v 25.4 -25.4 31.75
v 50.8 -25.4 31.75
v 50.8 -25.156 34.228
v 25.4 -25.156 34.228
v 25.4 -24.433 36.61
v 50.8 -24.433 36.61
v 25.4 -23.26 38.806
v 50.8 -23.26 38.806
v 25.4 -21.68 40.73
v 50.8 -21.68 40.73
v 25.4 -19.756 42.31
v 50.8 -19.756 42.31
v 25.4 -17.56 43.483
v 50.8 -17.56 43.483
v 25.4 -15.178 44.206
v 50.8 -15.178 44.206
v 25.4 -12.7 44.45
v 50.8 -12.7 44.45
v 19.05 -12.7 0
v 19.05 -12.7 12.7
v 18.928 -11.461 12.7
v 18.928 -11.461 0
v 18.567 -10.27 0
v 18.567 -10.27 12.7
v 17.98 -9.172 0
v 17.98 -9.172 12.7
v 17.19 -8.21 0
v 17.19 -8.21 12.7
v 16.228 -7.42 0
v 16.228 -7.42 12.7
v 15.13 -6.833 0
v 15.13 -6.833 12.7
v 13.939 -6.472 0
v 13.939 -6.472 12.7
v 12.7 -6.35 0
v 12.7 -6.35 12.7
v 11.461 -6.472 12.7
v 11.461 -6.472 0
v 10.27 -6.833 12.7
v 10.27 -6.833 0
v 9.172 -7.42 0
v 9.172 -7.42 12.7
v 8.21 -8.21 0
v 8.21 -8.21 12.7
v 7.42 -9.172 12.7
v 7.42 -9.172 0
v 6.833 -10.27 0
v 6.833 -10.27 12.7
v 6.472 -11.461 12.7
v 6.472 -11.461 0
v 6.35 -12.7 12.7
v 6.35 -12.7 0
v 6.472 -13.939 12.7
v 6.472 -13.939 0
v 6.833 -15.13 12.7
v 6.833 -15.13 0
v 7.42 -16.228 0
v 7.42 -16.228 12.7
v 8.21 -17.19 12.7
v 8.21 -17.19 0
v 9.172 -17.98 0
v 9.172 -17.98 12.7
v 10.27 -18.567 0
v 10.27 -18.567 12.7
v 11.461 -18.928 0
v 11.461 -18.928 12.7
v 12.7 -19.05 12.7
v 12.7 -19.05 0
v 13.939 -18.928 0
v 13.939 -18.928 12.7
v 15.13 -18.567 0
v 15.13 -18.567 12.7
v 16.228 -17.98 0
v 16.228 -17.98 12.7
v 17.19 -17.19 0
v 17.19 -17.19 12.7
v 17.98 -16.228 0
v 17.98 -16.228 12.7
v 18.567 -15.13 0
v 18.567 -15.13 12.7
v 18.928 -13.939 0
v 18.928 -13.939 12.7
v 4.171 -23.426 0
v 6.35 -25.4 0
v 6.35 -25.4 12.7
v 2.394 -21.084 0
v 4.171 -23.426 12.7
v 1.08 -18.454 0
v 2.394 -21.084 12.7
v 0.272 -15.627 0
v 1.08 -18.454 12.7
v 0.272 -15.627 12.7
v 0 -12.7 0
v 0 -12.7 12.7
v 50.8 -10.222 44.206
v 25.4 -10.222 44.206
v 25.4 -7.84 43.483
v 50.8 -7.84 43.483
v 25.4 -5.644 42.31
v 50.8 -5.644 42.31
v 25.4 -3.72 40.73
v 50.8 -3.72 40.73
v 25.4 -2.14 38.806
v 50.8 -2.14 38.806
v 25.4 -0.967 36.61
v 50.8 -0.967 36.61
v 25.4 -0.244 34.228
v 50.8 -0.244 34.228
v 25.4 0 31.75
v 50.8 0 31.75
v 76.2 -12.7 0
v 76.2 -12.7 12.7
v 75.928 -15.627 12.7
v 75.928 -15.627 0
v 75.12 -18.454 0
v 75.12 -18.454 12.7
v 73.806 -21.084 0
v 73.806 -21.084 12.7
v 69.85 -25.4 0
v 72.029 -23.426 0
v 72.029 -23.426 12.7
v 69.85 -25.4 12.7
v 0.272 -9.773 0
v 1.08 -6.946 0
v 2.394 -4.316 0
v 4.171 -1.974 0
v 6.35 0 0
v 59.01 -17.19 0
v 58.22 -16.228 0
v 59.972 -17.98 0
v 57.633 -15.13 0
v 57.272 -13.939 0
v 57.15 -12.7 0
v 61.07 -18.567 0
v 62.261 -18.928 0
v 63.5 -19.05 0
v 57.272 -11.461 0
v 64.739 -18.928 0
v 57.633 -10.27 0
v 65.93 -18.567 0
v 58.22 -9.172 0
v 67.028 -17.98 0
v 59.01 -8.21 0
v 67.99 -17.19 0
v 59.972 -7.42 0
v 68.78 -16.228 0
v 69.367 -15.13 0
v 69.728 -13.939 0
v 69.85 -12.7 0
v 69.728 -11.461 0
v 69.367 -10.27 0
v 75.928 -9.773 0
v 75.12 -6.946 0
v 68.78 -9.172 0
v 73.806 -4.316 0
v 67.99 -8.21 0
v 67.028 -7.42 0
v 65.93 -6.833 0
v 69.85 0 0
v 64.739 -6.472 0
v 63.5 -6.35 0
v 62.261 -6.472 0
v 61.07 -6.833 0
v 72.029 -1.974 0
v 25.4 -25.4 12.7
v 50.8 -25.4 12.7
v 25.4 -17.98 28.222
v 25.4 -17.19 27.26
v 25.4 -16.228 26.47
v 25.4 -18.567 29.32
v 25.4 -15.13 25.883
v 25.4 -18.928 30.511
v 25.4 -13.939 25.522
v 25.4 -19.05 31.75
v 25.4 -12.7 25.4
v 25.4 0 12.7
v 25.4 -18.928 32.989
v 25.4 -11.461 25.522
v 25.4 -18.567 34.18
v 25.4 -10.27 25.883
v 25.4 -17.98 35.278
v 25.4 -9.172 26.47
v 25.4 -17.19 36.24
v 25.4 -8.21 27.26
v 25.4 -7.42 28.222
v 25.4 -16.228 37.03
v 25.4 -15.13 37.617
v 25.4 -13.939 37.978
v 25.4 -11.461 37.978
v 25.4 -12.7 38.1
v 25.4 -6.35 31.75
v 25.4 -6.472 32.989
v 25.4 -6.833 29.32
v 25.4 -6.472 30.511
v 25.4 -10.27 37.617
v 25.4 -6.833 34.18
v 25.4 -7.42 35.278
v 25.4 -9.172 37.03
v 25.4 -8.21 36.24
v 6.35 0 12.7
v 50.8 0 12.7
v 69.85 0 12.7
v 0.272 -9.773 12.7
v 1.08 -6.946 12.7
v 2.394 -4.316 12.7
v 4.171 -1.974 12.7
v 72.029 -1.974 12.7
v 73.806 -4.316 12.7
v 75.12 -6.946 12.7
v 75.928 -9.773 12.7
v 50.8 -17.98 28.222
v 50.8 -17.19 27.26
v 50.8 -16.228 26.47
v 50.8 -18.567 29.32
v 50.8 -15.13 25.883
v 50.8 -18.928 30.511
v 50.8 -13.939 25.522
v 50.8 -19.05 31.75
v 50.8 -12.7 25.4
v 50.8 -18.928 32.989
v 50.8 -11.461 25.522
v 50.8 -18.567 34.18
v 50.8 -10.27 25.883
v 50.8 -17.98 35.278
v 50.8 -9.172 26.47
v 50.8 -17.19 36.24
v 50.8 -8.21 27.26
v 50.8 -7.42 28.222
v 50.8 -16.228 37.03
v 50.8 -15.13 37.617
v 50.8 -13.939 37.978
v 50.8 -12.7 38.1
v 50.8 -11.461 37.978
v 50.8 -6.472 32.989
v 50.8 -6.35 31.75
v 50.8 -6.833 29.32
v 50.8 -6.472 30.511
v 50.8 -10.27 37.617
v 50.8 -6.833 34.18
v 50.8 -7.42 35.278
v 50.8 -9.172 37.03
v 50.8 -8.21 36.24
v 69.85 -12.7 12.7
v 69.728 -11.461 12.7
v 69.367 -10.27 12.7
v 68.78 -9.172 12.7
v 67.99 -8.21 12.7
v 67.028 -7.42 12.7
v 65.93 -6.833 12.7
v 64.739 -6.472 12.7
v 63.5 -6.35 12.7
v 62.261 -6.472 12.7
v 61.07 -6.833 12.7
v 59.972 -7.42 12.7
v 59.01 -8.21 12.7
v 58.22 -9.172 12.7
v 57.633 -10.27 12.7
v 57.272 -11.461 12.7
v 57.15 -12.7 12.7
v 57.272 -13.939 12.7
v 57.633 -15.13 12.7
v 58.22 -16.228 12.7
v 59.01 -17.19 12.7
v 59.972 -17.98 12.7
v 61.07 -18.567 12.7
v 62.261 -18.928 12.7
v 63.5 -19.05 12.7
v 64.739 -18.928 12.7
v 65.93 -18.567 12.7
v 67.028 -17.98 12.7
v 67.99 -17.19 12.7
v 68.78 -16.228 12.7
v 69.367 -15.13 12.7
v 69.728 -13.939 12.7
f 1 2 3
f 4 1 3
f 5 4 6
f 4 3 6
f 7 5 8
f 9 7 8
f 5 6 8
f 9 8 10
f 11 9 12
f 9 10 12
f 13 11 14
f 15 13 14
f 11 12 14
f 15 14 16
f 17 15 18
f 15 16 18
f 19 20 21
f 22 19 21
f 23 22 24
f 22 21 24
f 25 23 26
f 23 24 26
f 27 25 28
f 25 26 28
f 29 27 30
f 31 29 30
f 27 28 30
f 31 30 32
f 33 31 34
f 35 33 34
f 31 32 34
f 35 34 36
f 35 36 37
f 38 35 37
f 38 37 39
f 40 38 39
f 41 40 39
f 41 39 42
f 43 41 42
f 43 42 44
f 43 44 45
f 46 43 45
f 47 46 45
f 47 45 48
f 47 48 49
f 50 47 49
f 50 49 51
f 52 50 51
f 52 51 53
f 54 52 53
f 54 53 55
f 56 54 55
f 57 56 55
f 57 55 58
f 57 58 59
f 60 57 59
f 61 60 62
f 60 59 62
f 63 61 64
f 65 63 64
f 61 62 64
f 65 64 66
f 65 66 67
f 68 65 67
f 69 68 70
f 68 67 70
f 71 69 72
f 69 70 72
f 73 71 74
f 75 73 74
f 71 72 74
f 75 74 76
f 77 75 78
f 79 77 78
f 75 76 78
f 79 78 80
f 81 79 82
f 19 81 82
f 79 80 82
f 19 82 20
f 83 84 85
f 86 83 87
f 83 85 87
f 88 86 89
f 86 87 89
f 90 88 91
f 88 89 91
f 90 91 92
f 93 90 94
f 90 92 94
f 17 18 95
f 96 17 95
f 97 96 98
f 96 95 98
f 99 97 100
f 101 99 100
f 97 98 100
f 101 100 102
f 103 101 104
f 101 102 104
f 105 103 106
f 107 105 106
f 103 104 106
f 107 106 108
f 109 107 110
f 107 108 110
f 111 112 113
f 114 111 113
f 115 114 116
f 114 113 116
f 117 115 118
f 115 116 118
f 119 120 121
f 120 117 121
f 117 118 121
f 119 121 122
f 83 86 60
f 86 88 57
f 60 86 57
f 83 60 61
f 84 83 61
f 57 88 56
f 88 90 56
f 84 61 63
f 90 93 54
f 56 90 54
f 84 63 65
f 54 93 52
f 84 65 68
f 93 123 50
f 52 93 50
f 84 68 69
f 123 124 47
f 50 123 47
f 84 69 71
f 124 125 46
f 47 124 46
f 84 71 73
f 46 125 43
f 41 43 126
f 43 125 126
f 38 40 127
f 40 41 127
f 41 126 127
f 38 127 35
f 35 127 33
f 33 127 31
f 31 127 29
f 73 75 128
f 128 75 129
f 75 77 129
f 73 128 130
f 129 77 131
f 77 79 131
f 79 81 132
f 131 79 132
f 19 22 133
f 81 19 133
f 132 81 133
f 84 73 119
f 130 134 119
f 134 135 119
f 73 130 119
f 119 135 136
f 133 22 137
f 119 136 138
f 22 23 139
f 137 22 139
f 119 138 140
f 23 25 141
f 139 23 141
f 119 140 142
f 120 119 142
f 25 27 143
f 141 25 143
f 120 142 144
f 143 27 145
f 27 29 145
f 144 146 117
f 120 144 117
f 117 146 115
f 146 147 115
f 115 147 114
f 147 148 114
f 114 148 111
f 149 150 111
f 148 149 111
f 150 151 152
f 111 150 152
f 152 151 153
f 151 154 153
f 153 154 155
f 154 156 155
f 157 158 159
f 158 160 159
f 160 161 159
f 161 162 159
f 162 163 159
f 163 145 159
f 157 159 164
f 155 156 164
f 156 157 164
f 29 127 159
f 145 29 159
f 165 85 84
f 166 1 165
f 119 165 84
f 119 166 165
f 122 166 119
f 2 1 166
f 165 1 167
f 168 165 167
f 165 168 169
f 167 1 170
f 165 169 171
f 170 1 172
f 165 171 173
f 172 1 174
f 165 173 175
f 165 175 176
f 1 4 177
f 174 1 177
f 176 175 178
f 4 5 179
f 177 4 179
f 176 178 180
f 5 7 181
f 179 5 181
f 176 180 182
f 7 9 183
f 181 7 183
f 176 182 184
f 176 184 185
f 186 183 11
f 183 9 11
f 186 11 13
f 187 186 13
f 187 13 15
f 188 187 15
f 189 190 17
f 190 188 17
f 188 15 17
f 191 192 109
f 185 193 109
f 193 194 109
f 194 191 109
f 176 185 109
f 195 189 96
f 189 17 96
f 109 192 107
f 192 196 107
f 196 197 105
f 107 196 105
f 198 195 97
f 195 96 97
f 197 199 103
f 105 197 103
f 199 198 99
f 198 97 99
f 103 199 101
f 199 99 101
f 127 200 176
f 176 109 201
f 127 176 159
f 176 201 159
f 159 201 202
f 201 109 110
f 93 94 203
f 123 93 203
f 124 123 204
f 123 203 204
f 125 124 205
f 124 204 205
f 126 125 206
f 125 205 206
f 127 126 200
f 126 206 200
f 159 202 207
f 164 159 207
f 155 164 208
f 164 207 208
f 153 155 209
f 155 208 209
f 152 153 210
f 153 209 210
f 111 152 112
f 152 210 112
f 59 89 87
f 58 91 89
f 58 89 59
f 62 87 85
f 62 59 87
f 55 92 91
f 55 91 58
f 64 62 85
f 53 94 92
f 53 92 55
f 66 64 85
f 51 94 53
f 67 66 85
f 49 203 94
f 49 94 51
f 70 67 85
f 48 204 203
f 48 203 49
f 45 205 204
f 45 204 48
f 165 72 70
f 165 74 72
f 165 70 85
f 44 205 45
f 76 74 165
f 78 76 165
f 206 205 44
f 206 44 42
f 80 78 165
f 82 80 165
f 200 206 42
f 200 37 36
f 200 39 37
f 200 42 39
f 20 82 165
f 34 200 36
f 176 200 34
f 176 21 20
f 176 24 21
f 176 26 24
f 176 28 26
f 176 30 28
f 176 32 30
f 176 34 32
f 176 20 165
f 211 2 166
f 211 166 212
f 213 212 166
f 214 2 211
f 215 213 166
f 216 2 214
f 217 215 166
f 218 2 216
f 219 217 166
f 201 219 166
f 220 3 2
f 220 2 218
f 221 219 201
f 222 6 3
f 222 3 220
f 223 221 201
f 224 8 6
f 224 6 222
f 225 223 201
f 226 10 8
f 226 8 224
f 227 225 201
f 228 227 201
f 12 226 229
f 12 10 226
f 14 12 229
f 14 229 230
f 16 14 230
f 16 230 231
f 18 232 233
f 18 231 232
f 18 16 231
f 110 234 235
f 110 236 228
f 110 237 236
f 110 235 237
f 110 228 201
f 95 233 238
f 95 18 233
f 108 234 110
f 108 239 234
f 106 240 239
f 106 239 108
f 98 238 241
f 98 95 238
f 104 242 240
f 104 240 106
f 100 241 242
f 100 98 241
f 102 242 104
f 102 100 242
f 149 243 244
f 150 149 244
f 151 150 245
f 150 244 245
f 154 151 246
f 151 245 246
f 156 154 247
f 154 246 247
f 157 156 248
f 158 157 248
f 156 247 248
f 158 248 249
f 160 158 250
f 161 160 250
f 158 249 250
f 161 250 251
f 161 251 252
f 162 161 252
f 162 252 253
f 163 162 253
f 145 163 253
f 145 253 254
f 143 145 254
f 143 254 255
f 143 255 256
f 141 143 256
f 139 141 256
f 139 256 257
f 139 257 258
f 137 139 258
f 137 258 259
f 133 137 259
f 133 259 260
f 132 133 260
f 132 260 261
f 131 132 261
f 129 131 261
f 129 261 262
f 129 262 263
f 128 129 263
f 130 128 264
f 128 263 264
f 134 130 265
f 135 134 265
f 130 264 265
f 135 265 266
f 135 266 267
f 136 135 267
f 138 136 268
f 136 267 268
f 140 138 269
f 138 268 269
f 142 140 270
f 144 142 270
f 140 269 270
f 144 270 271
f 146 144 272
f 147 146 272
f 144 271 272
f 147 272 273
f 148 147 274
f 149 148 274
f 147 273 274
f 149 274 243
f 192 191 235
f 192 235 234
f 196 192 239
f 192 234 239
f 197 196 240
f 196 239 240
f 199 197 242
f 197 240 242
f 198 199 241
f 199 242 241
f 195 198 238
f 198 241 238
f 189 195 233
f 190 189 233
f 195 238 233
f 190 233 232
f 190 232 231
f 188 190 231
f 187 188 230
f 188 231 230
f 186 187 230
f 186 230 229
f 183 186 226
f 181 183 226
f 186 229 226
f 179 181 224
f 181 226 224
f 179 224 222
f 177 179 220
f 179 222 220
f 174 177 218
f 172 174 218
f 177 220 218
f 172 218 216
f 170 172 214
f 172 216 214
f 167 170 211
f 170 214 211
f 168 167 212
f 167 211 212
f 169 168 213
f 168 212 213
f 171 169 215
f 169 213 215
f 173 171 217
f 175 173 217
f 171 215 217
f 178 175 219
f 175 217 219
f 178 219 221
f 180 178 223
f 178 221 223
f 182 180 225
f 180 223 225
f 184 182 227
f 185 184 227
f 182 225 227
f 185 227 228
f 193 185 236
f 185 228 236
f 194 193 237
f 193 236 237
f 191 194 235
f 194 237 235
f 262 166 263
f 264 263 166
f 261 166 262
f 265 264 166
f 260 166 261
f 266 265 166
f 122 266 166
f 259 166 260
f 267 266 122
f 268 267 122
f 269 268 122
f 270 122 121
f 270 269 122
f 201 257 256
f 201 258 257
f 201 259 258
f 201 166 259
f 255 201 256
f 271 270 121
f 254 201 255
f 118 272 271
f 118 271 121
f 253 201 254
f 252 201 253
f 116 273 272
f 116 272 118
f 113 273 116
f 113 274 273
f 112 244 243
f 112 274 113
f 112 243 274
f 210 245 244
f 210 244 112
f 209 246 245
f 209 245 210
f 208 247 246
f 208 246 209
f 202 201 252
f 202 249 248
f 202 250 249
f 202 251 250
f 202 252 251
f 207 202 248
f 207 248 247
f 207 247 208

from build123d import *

# Parameters (mm, degrees)
F0_W      = 76.2
F0_H      = 44.45
F1_DEPTH  = 25.4
F2_W      = 25.4
F2_H      = 25.4
F3_DEPTH  = 31.75
F4_R      = 6.35
F5_DEPTH  = 25.4
F6_R      = 6.35
F7_DEPTH  = 25.4
F9_DEPTH  = 25.4
F11_DEPTH = 25.4
F13_DEPTH = 25.4


with BuildPart() as f1:
    # F0 (on Front) → F1 (new body)
    with BuildSketch(Plane.XZ):
        with Locations((38.1, 22.225)):
            Rectangle(F0_W, F0_H)
    extrude(amount=F1_DEPTH)

    # F2 (on face) → F3 (cut)
    with BuildSketch(Plane.XY.offset(44.45)):
        with Locations((63.5, -12.7)):
            Rectangle(F2_W, F2_H)
        with Locations((12.7, -12.7)):
            Rectangle(F2_W, F2_H)
    extrude(amount=-F3_DEPTH, mode=Mode.SUBTRACT)

    # F4 (on face) → F5 (cut)
    with BuildSketch(Plane.XY.offset(12.7)):
        with Locations((12.7, -12.7)):
            Circle(F4_R)
        with Locations((63.5, -12.7)):
            Circle(F4_R)
    extrude(amount=-F5_DEPTH, mode=Mode.SUBTRACT)

    # F6 (on face) → F7 (cut)
    with BuildSketch(Plane.YZ.offset(50.8)):
        with Locations((-12.7, 31.75)):
            Circle(F6_R)
    extrude(amount=-F7_DEPTH, mode=Mode.SUBTRACT)

    # F8 (on face) → F9 (cut)
    with BuildSketch(Plane.XY.offset(12.7)):
        with BuildLine():
            ThreePointArc((69.85, 0), (74.5240316571, -5.6004841714), (76.2, -12.7))
            Line((76.2, -12.7), (76.2, 0))
            Line((76.2, 0), (69.85, 0))
        make_face()
        with BuildLine():
            ThreePointArc((76.2, -12.7), (74.5240316571, -19.7995158286), (69.85, -25.4))
            Line((69.85, -25.4), (76.2, -25.4))
            Line((76.2, -25.4), (76.2, -12.7))
        make_face()
    extrude(amount=-F9_DEPTH, mode=Mode.SUBTRACT)

    # F10 (on face) → F11 (cut)
    with BuildSketch(Plane.XY.offset(12.7)):
        with BuildLine():
            ThreePointArc((0, -12.6999999584), (1.6759683522, -5.6004841529), (6.35, 0))
            Line((6.35, 0), (0, 0))
            Line((0, 0), (0, -12.6999999584))
        make_face()
        with BuildLine():
            ThreePointArc((6.35, -25.4), (1.6759683336, -19.79951581), (0, -12.6999999584))
            Line((0, -12.6999999584), (0, -25.4))
            Line((0, -25.4), (6.35, -25.4))
        make_face()
    extrude(amount=-F11_DEPTH, mode=Mode.SUBTRACT)

    # F12 (on face) → F13 (cut)
    with BuildSketch(Plane.YZ.offset(50.8)):
        with BuildLine():
            ThreePointArc((-25.4, 31.75), (-21.6802561211, 40.7302561211), (-12.7, 44.45))
            Line((-12.7, 44.45), (-25.4, 44.45))
            Line((-25.4, 44.45), (-25.4, 31.75))
        make_face()
        with BuildLine():
            ThreePointArc((-12.7, 44.45), (-3.7197438789, 40.7302561211), (0, 31.75))
            Line((0, 31.75), (0, 44.45))
            Line((0, 44.45), (-12.7, 44.45))
        make_face()
    extrude(amount=-F13_DEPTH, mode=Mode.SUBTRACT)


solid = f1.part
